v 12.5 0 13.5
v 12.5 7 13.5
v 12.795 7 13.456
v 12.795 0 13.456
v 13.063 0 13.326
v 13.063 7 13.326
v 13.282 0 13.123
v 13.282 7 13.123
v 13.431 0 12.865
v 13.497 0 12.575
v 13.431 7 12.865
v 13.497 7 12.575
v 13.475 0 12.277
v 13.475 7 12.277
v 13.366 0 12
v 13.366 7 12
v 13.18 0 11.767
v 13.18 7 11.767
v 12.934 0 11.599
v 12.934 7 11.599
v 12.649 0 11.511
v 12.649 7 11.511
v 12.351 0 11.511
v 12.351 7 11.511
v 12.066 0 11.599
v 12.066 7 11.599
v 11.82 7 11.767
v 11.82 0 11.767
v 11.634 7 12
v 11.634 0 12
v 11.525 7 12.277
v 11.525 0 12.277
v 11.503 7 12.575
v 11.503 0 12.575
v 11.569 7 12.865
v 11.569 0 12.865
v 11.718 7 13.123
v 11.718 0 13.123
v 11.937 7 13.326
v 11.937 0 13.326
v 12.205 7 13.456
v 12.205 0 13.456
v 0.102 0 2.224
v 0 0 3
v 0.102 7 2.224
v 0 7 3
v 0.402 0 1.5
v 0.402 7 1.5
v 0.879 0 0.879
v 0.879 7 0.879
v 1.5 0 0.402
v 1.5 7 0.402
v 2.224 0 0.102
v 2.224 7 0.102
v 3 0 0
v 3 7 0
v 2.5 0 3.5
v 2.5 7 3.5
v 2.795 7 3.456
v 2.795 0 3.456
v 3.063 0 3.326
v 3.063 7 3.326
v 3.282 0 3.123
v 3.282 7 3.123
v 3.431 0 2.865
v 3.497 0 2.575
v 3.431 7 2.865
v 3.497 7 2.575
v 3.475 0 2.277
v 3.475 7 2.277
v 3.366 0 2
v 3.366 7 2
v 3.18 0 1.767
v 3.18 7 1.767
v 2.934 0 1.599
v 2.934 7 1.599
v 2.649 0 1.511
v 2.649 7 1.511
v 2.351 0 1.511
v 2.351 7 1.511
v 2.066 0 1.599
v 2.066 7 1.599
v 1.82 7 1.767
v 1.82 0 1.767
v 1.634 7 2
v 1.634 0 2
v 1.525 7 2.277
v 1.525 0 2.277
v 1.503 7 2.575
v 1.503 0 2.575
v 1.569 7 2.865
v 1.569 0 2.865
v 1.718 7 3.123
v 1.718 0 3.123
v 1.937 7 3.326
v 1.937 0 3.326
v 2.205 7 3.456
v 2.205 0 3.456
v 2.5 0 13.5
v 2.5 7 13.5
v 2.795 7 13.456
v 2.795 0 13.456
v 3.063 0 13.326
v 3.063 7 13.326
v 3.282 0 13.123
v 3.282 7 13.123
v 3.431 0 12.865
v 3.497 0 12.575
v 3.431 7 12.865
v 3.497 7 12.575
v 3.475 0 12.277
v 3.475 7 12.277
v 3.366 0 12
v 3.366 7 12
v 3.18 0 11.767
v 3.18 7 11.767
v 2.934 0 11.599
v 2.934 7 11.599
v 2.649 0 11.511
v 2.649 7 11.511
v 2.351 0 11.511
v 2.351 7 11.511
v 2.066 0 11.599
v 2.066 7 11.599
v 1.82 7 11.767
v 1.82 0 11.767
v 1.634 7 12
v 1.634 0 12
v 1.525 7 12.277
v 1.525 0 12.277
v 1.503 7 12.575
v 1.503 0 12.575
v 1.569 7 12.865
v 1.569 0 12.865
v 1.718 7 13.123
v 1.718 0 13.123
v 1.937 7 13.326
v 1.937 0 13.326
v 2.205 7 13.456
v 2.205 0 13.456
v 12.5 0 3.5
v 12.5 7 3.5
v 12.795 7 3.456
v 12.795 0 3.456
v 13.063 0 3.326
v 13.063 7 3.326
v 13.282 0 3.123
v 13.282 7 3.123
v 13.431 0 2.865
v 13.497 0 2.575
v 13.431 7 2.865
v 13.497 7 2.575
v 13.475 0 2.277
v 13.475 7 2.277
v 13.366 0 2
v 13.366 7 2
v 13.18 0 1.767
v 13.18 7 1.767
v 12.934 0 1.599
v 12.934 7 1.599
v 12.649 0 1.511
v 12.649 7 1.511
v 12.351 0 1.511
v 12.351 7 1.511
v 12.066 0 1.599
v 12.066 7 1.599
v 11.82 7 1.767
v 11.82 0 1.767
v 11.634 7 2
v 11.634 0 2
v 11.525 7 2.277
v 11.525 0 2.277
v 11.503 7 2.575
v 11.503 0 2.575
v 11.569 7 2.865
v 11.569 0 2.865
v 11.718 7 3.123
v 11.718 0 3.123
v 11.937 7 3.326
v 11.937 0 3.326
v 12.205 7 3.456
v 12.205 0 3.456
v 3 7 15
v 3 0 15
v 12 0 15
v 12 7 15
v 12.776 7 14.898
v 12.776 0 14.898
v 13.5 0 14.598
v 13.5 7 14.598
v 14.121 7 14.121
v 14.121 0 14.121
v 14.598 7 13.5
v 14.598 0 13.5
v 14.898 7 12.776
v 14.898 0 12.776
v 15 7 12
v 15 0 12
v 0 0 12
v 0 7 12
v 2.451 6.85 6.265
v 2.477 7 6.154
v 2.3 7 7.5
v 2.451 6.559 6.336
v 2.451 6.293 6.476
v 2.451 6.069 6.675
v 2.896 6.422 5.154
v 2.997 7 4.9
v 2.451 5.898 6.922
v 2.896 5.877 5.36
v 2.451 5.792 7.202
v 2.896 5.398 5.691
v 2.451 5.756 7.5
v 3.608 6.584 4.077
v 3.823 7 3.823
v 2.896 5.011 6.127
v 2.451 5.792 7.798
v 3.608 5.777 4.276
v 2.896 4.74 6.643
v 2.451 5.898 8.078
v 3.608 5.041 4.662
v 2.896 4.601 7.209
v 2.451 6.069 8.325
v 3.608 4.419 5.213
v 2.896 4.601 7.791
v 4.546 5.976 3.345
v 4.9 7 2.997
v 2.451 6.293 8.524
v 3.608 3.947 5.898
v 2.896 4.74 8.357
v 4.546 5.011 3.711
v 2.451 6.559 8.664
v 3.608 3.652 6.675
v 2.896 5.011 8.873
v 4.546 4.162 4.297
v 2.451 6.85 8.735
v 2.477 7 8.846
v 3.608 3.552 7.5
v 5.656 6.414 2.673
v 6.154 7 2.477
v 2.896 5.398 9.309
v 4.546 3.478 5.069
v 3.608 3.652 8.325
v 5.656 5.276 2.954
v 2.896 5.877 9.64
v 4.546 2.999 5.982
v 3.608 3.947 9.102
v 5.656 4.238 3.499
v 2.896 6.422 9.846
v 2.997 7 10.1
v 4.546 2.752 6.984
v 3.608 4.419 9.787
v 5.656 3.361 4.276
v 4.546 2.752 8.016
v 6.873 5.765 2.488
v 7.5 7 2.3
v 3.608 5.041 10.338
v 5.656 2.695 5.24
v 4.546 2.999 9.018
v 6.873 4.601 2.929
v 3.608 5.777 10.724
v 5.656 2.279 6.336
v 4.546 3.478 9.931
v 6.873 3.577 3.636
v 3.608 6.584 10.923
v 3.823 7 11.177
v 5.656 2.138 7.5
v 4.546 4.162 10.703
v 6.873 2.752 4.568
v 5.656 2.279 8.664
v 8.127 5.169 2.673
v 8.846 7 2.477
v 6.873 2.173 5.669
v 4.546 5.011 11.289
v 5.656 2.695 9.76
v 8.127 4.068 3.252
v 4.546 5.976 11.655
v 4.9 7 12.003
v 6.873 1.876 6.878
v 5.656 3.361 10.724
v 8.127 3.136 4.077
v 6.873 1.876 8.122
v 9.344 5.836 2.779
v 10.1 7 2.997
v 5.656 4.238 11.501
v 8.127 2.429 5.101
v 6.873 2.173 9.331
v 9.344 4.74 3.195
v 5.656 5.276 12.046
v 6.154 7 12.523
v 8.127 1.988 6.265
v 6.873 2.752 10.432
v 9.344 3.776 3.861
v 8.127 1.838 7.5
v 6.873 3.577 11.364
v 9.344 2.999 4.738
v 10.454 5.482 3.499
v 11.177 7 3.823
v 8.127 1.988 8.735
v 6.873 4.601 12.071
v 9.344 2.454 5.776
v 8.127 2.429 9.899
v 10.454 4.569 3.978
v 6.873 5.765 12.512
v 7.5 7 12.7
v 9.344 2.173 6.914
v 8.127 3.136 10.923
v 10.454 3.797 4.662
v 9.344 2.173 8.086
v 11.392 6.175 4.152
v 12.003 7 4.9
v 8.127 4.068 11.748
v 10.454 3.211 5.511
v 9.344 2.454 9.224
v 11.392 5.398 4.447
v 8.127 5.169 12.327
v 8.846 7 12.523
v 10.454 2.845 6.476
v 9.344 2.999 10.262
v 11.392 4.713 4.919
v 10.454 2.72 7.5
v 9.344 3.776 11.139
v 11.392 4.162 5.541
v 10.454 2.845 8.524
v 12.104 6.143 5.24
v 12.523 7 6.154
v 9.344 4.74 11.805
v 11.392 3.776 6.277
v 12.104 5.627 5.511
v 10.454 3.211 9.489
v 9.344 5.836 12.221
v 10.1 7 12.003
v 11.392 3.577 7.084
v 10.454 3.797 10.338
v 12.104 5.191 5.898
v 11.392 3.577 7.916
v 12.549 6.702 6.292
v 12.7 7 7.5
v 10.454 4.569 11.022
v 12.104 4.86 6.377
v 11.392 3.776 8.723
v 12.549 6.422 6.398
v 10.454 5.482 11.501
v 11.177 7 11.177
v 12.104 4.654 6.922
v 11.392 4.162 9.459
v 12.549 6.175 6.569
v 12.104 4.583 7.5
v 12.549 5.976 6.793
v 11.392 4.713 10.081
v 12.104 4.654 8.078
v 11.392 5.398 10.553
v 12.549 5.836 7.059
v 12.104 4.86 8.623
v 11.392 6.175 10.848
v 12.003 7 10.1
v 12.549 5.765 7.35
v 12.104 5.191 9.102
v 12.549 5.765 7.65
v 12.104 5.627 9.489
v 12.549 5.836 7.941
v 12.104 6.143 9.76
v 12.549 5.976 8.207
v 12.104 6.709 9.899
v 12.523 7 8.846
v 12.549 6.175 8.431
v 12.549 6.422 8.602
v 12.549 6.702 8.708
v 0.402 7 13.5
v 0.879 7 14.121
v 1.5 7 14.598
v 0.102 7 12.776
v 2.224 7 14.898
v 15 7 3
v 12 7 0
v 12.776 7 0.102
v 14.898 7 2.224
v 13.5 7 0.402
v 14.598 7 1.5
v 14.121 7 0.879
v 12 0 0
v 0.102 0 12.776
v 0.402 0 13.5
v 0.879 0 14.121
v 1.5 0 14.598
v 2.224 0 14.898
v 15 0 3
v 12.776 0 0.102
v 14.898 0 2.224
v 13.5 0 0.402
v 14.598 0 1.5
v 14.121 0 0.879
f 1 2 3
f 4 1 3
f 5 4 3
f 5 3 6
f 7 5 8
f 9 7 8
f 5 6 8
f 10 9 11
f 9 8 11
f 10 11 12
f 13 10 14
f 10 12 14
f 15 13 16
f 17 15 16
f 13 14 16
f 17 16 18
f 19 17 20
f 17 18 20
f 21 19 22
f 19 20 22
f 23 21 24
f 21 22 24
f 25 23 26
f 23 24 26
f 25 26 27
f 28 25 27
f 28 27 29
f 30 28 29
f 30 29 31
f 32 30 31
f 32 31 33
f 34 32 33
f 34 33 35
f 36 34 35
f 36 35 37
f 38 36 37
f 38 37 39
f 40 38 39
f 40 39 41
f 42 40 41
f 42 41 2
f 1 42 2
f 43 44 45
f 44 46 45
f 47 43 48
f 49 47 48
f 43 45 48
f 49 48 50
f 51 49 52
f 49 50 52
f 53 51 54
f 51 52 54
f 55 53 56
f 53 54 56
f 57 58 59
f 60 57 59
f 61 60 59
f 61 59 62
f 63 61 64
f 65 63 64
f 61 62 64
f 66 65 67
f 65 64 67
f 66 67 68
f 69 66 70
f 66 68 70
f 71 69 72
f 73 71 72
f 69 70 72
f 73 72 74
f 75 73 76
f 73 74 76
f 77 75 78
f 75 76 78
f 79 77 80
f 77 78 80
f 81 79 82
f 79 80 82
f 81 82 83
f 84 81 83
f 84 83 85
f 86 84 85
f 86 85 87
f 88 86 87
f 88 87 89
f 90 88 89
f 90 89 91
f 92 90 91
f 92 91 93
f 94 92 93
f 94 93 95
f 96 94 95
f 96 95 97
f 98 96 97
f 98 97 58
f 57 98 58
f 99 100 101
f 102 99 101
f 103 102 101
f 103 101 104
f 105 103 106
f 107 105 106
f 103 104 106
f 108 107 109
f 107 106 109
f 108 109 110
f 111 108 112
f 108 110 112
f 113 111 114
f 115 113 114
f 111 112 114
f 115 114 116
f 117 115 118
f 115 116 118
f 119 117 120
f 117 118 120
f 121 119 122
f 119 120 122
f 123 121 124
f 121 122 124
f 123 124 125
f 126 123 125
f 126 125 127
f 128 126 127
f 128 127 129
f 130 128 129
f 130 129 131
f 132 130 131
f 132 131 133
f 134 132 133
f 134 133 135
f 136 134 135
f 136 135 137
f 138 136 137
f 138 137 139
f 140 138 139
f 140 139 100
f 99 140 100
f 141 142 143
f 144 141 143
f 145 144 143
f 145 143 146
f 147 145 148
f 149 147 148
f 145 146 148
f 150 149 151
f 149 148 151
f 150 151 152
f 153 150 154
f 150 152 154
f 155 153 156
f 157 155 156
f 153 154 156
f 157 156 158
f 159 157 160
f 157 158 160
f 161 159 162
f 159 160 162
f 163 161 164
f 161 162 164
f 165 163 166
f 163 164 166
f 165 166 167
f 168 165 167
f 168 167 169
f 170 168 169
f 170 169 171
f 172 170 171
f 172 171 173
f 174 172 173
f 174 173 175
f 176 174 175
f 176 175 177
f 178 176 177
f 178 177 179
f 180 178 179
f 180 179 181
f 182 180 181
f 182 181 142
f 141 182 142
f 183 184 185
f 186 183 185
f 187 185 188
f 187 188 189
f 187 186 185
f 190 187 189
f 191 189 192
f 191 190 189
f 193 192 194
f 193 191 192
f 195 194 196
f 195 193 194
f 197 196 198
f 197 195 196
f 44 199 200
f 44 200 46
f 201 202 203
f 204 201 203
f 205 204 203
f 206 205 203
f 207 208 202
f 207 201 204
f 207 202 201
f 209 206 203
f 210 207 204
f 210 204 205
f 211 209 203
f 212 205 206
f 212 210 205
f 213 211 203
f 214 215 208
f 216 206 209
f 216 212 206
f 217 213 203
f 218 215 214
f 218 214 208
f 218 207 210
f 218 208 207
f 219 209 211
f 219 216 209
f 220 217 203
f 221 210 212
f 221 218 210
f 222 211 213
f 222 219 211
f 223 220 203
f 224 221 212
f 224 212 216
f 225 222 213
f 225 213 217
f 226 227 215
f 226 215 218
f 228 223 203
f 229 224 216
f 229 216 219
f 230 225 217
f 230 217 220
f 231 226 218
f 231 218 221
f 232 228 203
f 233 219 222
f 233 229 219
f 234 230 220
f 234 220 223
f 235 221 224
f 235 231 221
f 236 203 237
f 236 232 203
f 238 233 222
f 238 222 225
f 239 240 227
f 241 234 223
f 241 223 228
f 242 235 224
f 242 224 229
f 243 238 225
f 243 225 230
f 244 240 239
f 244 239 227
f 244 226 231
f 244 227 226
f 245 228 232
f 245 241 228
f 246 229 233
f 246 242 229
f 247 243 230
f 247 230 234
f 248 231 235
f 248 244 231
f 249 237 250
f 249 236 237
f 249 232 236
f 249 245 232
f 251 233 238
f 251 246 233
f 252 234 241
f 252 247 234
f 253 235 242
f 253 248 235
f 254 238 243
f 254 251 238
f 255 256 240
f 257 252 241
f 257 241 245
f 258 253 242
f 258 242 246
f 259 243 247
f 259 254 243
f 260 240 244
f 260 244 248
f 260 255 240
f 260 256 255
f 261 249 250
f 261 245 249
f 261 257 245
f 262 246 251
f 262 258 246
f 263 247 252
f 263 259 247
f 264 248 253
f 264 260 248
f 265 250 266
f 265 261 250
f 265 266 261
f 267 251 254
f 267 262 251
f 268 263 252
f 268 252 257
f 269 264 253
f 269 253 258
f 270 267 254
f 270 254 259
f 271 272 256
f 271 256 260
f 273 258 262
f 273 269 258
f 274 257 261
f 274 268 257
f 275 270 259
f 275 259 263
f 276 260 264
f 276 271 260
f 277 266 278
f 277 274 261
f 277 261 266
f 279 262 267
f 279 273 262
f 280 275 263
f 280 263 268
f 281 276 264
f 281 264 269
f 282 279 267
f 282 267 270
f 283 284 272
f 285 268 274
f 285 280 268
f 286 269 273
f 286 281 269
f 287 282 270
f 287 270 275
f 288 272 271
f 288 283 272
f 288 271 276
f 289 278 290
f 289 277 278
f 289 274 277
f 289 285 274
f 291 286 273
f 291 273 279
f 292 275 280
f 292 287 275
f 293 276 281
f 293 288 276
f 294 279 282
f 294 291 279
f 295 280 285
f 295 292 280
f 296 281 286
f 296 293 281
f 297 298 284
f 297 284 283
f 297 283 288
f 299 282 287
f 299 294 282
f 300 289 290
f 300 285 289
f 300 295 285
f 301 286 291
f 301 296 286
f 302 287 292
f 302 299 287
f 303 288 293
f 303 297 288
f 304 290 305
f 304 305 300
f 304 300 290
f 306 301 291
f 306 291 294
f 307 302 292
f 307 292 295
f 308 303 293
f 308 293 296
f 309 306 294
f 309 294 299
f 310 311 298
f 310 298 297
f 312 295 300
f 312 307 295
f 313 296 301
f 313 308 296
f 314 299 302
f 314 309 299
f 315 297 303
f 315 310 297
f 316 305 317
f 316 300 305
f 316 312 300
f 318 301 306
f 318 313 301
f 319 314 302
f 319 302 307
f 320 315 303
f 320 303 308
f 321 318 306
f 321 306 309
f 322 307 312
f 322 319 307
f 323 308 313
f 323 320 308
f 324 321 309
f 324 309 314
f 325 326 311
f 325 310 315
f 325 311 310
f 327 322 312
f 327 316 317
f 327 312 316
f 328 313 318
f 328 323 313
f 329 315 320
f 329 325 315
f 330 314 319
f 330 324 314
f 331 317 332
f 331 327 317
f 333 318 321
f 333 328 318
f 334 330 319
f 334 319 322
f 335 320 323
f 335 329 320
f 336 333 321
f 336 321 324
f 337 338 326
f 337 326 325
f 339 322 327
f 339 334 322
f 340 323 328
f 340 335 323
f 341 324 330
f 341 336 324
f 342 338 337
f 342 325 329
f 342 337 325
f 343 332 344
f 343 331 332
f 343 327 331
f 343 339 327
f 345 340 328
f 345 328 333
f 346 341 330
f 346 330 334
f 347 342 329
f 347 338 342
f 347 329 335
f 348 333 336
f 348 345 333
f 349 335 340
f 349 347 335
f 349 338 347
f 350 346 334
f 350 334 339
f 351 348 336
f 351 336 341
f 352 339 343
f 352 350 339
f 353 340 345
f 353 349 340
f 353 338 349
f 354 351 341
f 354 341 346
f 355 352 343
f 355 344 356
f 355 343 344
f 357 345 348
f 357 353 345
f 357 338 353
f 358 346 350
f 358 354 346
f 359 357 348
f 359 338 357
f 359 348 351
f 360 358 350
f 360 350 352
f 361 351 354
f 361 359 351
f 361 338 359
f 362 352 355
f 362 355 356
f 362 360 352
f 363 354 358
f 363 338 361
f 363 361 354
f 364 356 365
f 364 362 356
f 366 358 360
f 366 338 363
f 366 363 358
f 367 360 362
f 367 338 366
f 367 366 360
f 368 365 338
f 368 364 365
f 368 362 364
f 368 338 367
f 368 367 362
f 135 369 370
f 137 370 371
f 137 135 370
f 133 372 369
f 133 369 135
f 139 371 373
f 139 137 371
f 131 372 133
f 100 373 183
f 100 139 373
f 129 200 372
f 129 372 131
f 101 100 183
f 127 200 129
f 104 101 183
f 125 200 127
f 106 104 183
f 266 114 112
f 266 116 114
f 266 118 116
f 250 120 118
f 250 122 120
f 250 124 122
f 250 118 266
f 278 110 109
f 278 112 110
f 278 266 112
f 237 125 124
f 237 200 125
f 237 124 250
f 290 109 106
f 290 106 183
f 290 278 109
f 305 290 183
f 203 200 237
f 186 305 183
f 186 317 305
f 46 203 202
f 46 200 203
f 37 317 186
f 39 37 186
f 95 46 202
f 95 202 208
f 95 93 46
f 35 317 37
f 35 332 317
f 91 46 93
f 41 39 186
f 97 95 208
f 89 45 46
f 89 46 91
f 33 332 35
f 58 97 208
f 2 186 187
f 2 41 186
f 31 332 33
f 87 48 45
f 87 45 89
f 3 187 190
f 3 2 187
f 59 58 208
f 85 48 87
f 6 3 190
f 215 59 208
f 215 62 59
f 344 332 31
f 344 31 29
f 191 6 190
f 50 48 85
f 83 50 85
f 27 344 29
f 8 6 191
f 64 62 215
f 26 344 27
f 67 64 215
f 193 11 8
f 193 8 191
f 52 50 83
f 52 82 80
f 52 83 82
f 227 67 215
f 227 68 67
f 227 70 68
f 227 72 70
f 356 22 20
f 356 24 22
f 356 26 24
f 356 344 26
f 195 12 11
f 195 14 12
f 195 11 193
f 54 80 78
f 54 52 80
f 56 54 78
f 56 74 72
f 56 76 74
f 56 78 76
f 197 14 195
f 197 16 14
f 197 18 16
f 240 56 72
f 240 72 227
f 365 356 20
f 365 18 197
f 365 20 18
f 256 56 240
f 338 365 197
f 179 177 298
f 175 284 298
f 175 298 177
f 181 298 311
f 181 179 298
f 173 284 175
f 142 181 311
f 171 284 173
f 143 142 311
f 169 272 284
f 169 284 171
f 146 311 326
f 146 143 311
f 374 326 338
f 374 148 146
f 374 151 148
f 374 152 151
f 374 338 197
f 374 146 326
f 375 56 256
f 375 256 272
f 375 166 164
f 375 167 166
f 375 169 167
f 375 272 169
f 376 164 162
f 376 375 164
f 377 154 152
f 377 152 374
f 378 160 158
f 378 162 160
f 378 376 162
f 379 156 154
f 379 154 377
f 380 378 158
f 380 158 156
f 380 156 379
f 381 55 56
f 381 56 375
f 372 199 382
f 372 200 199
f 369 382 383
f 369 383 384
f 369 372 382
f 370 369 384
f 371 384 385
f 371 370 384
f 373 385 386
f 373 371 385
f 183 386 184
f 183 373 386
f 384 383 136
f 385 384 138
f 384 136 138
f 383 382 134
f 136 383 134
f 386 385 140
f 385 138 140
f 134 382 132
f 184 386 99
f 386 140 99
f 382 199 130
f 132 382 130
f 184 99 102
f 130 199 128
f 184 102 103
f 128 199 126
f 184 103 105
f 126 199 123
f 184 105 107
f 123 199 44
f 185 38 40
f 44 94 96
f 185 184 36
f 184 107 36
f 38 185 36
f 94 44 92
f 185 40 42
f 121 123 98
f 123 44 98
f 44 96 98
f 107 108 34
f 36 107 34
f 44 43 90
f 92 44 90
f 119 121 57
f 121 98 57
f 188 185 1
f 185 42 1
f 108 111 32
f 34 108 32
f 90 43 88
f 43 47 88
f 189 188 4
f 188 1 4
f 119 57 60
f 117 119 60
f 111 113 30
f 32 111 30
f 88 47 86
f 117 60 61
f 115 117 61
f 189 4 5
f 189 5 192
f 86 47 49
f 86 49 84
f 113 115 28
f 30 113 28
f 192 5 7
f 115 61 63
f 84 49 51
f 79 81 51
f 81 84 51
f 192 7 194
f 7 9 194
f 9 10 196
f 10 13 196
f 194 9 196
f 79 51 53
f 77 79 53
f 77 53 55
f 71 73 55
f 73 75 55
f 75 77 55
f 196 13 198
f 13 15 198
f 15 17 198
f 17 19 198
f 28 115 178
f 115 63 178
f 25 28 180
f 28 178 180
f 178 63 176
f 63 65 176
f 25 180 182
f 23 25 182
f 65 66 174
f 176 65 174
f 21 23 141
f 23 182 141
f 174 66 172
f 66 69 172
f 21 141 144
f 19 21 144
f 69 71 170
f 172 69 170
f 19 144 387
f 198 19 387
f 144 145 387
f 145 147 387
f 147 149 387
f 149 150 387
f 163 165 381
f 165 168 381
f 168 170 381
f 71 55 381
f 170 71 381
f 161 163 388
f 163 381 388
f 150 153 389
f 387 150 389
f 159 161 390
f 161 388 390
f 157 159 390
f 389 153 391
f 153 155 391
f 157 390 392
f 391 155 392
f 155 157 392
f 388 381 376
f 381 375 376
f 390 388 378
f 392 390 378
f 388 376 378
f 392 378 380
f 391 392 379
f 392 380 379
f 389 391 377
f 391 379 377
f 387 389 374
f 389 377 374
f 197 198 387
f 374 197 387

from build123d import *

# Parameters (mm, degrees)
SKETCH1_W           = 15
SKETCH1_H           = 15
BOSS_EXTRUDE1_DEPTH = 7
SKETCH3_R           = 1
CUT_EXTRUDE1_DEPTH  = 23.338307904
FILLET1_R           = 3


with BuildPart() as part:
    # Sketch1 → Boss-Extrude1 (new body)
    with BuildSketch(Plane(origin=(0, 0, 0), x_dir=(1, 0, 0), z_dir=(0, 1, 0))):
        with Locations((7.5, -7.5)):
            Rectangle(SKETCH1_W, SKETCH1_H)
    extrude(amount=BOSS_EXTRUDE1_DEPTH)

    # Sketch2 → Cut-Revolve1 (revolve, cut)
    with BuildSketch(Plane(origin=(0, 7, 0), x_dir=(1, 0, 0), z_dir=(0, 1, 0))):
        with BuildLine():
            Line((12.7, -7.5), (2.3, -7.5))
            ThreePointArc((2.3, -7.5), (7.5, -12.7), (12.7, -7.5))
        make_face()
    revolve(axis=Axis((12.7, 7, 7.5), (-1, 0, 0)), mode=Mode.SUBTRACT)

    # Sketch3 → Cut-Extrude1 (cut, through all)
    with BuildSketch(Plane(origin=(0, 7, 0), x_dir=(1, 0, 0), z_dir=(0, 1, 0))):
        with Locations(Location((2.5, -12.5, 0), (0, 0, 270))):
            Circle(SKETCH3_R)
        with Locations(Location((12.5, -12.5, 0), (0, 0, 270))):
            Circle(SKETCH3_R)
        with Locations(Location((12.5, -2.5, 0), (0, 0, 270))):
            Circle(SKETCH3_R)
        with Locations(Location((2.5, -2.5, 0), (0, 0, 270))):
            Circle(SKETCH3_R)
    extrude(amount=-CUT_EXTRUDE1_DEPTH, mode=Mode.SUBTRACT)

    # Fillet1
    fillet1_edges = [part.edges().sort_by_distance(p)[0] for p in [
        (0, 3.5, 0),
        (15, 3.5, 0),
        (15, 3.5, 15),
        (0, 3.5, 15),
    ]]
    fillet(fillet1_edges, radius=FILLET1_R)


solid = part.part
